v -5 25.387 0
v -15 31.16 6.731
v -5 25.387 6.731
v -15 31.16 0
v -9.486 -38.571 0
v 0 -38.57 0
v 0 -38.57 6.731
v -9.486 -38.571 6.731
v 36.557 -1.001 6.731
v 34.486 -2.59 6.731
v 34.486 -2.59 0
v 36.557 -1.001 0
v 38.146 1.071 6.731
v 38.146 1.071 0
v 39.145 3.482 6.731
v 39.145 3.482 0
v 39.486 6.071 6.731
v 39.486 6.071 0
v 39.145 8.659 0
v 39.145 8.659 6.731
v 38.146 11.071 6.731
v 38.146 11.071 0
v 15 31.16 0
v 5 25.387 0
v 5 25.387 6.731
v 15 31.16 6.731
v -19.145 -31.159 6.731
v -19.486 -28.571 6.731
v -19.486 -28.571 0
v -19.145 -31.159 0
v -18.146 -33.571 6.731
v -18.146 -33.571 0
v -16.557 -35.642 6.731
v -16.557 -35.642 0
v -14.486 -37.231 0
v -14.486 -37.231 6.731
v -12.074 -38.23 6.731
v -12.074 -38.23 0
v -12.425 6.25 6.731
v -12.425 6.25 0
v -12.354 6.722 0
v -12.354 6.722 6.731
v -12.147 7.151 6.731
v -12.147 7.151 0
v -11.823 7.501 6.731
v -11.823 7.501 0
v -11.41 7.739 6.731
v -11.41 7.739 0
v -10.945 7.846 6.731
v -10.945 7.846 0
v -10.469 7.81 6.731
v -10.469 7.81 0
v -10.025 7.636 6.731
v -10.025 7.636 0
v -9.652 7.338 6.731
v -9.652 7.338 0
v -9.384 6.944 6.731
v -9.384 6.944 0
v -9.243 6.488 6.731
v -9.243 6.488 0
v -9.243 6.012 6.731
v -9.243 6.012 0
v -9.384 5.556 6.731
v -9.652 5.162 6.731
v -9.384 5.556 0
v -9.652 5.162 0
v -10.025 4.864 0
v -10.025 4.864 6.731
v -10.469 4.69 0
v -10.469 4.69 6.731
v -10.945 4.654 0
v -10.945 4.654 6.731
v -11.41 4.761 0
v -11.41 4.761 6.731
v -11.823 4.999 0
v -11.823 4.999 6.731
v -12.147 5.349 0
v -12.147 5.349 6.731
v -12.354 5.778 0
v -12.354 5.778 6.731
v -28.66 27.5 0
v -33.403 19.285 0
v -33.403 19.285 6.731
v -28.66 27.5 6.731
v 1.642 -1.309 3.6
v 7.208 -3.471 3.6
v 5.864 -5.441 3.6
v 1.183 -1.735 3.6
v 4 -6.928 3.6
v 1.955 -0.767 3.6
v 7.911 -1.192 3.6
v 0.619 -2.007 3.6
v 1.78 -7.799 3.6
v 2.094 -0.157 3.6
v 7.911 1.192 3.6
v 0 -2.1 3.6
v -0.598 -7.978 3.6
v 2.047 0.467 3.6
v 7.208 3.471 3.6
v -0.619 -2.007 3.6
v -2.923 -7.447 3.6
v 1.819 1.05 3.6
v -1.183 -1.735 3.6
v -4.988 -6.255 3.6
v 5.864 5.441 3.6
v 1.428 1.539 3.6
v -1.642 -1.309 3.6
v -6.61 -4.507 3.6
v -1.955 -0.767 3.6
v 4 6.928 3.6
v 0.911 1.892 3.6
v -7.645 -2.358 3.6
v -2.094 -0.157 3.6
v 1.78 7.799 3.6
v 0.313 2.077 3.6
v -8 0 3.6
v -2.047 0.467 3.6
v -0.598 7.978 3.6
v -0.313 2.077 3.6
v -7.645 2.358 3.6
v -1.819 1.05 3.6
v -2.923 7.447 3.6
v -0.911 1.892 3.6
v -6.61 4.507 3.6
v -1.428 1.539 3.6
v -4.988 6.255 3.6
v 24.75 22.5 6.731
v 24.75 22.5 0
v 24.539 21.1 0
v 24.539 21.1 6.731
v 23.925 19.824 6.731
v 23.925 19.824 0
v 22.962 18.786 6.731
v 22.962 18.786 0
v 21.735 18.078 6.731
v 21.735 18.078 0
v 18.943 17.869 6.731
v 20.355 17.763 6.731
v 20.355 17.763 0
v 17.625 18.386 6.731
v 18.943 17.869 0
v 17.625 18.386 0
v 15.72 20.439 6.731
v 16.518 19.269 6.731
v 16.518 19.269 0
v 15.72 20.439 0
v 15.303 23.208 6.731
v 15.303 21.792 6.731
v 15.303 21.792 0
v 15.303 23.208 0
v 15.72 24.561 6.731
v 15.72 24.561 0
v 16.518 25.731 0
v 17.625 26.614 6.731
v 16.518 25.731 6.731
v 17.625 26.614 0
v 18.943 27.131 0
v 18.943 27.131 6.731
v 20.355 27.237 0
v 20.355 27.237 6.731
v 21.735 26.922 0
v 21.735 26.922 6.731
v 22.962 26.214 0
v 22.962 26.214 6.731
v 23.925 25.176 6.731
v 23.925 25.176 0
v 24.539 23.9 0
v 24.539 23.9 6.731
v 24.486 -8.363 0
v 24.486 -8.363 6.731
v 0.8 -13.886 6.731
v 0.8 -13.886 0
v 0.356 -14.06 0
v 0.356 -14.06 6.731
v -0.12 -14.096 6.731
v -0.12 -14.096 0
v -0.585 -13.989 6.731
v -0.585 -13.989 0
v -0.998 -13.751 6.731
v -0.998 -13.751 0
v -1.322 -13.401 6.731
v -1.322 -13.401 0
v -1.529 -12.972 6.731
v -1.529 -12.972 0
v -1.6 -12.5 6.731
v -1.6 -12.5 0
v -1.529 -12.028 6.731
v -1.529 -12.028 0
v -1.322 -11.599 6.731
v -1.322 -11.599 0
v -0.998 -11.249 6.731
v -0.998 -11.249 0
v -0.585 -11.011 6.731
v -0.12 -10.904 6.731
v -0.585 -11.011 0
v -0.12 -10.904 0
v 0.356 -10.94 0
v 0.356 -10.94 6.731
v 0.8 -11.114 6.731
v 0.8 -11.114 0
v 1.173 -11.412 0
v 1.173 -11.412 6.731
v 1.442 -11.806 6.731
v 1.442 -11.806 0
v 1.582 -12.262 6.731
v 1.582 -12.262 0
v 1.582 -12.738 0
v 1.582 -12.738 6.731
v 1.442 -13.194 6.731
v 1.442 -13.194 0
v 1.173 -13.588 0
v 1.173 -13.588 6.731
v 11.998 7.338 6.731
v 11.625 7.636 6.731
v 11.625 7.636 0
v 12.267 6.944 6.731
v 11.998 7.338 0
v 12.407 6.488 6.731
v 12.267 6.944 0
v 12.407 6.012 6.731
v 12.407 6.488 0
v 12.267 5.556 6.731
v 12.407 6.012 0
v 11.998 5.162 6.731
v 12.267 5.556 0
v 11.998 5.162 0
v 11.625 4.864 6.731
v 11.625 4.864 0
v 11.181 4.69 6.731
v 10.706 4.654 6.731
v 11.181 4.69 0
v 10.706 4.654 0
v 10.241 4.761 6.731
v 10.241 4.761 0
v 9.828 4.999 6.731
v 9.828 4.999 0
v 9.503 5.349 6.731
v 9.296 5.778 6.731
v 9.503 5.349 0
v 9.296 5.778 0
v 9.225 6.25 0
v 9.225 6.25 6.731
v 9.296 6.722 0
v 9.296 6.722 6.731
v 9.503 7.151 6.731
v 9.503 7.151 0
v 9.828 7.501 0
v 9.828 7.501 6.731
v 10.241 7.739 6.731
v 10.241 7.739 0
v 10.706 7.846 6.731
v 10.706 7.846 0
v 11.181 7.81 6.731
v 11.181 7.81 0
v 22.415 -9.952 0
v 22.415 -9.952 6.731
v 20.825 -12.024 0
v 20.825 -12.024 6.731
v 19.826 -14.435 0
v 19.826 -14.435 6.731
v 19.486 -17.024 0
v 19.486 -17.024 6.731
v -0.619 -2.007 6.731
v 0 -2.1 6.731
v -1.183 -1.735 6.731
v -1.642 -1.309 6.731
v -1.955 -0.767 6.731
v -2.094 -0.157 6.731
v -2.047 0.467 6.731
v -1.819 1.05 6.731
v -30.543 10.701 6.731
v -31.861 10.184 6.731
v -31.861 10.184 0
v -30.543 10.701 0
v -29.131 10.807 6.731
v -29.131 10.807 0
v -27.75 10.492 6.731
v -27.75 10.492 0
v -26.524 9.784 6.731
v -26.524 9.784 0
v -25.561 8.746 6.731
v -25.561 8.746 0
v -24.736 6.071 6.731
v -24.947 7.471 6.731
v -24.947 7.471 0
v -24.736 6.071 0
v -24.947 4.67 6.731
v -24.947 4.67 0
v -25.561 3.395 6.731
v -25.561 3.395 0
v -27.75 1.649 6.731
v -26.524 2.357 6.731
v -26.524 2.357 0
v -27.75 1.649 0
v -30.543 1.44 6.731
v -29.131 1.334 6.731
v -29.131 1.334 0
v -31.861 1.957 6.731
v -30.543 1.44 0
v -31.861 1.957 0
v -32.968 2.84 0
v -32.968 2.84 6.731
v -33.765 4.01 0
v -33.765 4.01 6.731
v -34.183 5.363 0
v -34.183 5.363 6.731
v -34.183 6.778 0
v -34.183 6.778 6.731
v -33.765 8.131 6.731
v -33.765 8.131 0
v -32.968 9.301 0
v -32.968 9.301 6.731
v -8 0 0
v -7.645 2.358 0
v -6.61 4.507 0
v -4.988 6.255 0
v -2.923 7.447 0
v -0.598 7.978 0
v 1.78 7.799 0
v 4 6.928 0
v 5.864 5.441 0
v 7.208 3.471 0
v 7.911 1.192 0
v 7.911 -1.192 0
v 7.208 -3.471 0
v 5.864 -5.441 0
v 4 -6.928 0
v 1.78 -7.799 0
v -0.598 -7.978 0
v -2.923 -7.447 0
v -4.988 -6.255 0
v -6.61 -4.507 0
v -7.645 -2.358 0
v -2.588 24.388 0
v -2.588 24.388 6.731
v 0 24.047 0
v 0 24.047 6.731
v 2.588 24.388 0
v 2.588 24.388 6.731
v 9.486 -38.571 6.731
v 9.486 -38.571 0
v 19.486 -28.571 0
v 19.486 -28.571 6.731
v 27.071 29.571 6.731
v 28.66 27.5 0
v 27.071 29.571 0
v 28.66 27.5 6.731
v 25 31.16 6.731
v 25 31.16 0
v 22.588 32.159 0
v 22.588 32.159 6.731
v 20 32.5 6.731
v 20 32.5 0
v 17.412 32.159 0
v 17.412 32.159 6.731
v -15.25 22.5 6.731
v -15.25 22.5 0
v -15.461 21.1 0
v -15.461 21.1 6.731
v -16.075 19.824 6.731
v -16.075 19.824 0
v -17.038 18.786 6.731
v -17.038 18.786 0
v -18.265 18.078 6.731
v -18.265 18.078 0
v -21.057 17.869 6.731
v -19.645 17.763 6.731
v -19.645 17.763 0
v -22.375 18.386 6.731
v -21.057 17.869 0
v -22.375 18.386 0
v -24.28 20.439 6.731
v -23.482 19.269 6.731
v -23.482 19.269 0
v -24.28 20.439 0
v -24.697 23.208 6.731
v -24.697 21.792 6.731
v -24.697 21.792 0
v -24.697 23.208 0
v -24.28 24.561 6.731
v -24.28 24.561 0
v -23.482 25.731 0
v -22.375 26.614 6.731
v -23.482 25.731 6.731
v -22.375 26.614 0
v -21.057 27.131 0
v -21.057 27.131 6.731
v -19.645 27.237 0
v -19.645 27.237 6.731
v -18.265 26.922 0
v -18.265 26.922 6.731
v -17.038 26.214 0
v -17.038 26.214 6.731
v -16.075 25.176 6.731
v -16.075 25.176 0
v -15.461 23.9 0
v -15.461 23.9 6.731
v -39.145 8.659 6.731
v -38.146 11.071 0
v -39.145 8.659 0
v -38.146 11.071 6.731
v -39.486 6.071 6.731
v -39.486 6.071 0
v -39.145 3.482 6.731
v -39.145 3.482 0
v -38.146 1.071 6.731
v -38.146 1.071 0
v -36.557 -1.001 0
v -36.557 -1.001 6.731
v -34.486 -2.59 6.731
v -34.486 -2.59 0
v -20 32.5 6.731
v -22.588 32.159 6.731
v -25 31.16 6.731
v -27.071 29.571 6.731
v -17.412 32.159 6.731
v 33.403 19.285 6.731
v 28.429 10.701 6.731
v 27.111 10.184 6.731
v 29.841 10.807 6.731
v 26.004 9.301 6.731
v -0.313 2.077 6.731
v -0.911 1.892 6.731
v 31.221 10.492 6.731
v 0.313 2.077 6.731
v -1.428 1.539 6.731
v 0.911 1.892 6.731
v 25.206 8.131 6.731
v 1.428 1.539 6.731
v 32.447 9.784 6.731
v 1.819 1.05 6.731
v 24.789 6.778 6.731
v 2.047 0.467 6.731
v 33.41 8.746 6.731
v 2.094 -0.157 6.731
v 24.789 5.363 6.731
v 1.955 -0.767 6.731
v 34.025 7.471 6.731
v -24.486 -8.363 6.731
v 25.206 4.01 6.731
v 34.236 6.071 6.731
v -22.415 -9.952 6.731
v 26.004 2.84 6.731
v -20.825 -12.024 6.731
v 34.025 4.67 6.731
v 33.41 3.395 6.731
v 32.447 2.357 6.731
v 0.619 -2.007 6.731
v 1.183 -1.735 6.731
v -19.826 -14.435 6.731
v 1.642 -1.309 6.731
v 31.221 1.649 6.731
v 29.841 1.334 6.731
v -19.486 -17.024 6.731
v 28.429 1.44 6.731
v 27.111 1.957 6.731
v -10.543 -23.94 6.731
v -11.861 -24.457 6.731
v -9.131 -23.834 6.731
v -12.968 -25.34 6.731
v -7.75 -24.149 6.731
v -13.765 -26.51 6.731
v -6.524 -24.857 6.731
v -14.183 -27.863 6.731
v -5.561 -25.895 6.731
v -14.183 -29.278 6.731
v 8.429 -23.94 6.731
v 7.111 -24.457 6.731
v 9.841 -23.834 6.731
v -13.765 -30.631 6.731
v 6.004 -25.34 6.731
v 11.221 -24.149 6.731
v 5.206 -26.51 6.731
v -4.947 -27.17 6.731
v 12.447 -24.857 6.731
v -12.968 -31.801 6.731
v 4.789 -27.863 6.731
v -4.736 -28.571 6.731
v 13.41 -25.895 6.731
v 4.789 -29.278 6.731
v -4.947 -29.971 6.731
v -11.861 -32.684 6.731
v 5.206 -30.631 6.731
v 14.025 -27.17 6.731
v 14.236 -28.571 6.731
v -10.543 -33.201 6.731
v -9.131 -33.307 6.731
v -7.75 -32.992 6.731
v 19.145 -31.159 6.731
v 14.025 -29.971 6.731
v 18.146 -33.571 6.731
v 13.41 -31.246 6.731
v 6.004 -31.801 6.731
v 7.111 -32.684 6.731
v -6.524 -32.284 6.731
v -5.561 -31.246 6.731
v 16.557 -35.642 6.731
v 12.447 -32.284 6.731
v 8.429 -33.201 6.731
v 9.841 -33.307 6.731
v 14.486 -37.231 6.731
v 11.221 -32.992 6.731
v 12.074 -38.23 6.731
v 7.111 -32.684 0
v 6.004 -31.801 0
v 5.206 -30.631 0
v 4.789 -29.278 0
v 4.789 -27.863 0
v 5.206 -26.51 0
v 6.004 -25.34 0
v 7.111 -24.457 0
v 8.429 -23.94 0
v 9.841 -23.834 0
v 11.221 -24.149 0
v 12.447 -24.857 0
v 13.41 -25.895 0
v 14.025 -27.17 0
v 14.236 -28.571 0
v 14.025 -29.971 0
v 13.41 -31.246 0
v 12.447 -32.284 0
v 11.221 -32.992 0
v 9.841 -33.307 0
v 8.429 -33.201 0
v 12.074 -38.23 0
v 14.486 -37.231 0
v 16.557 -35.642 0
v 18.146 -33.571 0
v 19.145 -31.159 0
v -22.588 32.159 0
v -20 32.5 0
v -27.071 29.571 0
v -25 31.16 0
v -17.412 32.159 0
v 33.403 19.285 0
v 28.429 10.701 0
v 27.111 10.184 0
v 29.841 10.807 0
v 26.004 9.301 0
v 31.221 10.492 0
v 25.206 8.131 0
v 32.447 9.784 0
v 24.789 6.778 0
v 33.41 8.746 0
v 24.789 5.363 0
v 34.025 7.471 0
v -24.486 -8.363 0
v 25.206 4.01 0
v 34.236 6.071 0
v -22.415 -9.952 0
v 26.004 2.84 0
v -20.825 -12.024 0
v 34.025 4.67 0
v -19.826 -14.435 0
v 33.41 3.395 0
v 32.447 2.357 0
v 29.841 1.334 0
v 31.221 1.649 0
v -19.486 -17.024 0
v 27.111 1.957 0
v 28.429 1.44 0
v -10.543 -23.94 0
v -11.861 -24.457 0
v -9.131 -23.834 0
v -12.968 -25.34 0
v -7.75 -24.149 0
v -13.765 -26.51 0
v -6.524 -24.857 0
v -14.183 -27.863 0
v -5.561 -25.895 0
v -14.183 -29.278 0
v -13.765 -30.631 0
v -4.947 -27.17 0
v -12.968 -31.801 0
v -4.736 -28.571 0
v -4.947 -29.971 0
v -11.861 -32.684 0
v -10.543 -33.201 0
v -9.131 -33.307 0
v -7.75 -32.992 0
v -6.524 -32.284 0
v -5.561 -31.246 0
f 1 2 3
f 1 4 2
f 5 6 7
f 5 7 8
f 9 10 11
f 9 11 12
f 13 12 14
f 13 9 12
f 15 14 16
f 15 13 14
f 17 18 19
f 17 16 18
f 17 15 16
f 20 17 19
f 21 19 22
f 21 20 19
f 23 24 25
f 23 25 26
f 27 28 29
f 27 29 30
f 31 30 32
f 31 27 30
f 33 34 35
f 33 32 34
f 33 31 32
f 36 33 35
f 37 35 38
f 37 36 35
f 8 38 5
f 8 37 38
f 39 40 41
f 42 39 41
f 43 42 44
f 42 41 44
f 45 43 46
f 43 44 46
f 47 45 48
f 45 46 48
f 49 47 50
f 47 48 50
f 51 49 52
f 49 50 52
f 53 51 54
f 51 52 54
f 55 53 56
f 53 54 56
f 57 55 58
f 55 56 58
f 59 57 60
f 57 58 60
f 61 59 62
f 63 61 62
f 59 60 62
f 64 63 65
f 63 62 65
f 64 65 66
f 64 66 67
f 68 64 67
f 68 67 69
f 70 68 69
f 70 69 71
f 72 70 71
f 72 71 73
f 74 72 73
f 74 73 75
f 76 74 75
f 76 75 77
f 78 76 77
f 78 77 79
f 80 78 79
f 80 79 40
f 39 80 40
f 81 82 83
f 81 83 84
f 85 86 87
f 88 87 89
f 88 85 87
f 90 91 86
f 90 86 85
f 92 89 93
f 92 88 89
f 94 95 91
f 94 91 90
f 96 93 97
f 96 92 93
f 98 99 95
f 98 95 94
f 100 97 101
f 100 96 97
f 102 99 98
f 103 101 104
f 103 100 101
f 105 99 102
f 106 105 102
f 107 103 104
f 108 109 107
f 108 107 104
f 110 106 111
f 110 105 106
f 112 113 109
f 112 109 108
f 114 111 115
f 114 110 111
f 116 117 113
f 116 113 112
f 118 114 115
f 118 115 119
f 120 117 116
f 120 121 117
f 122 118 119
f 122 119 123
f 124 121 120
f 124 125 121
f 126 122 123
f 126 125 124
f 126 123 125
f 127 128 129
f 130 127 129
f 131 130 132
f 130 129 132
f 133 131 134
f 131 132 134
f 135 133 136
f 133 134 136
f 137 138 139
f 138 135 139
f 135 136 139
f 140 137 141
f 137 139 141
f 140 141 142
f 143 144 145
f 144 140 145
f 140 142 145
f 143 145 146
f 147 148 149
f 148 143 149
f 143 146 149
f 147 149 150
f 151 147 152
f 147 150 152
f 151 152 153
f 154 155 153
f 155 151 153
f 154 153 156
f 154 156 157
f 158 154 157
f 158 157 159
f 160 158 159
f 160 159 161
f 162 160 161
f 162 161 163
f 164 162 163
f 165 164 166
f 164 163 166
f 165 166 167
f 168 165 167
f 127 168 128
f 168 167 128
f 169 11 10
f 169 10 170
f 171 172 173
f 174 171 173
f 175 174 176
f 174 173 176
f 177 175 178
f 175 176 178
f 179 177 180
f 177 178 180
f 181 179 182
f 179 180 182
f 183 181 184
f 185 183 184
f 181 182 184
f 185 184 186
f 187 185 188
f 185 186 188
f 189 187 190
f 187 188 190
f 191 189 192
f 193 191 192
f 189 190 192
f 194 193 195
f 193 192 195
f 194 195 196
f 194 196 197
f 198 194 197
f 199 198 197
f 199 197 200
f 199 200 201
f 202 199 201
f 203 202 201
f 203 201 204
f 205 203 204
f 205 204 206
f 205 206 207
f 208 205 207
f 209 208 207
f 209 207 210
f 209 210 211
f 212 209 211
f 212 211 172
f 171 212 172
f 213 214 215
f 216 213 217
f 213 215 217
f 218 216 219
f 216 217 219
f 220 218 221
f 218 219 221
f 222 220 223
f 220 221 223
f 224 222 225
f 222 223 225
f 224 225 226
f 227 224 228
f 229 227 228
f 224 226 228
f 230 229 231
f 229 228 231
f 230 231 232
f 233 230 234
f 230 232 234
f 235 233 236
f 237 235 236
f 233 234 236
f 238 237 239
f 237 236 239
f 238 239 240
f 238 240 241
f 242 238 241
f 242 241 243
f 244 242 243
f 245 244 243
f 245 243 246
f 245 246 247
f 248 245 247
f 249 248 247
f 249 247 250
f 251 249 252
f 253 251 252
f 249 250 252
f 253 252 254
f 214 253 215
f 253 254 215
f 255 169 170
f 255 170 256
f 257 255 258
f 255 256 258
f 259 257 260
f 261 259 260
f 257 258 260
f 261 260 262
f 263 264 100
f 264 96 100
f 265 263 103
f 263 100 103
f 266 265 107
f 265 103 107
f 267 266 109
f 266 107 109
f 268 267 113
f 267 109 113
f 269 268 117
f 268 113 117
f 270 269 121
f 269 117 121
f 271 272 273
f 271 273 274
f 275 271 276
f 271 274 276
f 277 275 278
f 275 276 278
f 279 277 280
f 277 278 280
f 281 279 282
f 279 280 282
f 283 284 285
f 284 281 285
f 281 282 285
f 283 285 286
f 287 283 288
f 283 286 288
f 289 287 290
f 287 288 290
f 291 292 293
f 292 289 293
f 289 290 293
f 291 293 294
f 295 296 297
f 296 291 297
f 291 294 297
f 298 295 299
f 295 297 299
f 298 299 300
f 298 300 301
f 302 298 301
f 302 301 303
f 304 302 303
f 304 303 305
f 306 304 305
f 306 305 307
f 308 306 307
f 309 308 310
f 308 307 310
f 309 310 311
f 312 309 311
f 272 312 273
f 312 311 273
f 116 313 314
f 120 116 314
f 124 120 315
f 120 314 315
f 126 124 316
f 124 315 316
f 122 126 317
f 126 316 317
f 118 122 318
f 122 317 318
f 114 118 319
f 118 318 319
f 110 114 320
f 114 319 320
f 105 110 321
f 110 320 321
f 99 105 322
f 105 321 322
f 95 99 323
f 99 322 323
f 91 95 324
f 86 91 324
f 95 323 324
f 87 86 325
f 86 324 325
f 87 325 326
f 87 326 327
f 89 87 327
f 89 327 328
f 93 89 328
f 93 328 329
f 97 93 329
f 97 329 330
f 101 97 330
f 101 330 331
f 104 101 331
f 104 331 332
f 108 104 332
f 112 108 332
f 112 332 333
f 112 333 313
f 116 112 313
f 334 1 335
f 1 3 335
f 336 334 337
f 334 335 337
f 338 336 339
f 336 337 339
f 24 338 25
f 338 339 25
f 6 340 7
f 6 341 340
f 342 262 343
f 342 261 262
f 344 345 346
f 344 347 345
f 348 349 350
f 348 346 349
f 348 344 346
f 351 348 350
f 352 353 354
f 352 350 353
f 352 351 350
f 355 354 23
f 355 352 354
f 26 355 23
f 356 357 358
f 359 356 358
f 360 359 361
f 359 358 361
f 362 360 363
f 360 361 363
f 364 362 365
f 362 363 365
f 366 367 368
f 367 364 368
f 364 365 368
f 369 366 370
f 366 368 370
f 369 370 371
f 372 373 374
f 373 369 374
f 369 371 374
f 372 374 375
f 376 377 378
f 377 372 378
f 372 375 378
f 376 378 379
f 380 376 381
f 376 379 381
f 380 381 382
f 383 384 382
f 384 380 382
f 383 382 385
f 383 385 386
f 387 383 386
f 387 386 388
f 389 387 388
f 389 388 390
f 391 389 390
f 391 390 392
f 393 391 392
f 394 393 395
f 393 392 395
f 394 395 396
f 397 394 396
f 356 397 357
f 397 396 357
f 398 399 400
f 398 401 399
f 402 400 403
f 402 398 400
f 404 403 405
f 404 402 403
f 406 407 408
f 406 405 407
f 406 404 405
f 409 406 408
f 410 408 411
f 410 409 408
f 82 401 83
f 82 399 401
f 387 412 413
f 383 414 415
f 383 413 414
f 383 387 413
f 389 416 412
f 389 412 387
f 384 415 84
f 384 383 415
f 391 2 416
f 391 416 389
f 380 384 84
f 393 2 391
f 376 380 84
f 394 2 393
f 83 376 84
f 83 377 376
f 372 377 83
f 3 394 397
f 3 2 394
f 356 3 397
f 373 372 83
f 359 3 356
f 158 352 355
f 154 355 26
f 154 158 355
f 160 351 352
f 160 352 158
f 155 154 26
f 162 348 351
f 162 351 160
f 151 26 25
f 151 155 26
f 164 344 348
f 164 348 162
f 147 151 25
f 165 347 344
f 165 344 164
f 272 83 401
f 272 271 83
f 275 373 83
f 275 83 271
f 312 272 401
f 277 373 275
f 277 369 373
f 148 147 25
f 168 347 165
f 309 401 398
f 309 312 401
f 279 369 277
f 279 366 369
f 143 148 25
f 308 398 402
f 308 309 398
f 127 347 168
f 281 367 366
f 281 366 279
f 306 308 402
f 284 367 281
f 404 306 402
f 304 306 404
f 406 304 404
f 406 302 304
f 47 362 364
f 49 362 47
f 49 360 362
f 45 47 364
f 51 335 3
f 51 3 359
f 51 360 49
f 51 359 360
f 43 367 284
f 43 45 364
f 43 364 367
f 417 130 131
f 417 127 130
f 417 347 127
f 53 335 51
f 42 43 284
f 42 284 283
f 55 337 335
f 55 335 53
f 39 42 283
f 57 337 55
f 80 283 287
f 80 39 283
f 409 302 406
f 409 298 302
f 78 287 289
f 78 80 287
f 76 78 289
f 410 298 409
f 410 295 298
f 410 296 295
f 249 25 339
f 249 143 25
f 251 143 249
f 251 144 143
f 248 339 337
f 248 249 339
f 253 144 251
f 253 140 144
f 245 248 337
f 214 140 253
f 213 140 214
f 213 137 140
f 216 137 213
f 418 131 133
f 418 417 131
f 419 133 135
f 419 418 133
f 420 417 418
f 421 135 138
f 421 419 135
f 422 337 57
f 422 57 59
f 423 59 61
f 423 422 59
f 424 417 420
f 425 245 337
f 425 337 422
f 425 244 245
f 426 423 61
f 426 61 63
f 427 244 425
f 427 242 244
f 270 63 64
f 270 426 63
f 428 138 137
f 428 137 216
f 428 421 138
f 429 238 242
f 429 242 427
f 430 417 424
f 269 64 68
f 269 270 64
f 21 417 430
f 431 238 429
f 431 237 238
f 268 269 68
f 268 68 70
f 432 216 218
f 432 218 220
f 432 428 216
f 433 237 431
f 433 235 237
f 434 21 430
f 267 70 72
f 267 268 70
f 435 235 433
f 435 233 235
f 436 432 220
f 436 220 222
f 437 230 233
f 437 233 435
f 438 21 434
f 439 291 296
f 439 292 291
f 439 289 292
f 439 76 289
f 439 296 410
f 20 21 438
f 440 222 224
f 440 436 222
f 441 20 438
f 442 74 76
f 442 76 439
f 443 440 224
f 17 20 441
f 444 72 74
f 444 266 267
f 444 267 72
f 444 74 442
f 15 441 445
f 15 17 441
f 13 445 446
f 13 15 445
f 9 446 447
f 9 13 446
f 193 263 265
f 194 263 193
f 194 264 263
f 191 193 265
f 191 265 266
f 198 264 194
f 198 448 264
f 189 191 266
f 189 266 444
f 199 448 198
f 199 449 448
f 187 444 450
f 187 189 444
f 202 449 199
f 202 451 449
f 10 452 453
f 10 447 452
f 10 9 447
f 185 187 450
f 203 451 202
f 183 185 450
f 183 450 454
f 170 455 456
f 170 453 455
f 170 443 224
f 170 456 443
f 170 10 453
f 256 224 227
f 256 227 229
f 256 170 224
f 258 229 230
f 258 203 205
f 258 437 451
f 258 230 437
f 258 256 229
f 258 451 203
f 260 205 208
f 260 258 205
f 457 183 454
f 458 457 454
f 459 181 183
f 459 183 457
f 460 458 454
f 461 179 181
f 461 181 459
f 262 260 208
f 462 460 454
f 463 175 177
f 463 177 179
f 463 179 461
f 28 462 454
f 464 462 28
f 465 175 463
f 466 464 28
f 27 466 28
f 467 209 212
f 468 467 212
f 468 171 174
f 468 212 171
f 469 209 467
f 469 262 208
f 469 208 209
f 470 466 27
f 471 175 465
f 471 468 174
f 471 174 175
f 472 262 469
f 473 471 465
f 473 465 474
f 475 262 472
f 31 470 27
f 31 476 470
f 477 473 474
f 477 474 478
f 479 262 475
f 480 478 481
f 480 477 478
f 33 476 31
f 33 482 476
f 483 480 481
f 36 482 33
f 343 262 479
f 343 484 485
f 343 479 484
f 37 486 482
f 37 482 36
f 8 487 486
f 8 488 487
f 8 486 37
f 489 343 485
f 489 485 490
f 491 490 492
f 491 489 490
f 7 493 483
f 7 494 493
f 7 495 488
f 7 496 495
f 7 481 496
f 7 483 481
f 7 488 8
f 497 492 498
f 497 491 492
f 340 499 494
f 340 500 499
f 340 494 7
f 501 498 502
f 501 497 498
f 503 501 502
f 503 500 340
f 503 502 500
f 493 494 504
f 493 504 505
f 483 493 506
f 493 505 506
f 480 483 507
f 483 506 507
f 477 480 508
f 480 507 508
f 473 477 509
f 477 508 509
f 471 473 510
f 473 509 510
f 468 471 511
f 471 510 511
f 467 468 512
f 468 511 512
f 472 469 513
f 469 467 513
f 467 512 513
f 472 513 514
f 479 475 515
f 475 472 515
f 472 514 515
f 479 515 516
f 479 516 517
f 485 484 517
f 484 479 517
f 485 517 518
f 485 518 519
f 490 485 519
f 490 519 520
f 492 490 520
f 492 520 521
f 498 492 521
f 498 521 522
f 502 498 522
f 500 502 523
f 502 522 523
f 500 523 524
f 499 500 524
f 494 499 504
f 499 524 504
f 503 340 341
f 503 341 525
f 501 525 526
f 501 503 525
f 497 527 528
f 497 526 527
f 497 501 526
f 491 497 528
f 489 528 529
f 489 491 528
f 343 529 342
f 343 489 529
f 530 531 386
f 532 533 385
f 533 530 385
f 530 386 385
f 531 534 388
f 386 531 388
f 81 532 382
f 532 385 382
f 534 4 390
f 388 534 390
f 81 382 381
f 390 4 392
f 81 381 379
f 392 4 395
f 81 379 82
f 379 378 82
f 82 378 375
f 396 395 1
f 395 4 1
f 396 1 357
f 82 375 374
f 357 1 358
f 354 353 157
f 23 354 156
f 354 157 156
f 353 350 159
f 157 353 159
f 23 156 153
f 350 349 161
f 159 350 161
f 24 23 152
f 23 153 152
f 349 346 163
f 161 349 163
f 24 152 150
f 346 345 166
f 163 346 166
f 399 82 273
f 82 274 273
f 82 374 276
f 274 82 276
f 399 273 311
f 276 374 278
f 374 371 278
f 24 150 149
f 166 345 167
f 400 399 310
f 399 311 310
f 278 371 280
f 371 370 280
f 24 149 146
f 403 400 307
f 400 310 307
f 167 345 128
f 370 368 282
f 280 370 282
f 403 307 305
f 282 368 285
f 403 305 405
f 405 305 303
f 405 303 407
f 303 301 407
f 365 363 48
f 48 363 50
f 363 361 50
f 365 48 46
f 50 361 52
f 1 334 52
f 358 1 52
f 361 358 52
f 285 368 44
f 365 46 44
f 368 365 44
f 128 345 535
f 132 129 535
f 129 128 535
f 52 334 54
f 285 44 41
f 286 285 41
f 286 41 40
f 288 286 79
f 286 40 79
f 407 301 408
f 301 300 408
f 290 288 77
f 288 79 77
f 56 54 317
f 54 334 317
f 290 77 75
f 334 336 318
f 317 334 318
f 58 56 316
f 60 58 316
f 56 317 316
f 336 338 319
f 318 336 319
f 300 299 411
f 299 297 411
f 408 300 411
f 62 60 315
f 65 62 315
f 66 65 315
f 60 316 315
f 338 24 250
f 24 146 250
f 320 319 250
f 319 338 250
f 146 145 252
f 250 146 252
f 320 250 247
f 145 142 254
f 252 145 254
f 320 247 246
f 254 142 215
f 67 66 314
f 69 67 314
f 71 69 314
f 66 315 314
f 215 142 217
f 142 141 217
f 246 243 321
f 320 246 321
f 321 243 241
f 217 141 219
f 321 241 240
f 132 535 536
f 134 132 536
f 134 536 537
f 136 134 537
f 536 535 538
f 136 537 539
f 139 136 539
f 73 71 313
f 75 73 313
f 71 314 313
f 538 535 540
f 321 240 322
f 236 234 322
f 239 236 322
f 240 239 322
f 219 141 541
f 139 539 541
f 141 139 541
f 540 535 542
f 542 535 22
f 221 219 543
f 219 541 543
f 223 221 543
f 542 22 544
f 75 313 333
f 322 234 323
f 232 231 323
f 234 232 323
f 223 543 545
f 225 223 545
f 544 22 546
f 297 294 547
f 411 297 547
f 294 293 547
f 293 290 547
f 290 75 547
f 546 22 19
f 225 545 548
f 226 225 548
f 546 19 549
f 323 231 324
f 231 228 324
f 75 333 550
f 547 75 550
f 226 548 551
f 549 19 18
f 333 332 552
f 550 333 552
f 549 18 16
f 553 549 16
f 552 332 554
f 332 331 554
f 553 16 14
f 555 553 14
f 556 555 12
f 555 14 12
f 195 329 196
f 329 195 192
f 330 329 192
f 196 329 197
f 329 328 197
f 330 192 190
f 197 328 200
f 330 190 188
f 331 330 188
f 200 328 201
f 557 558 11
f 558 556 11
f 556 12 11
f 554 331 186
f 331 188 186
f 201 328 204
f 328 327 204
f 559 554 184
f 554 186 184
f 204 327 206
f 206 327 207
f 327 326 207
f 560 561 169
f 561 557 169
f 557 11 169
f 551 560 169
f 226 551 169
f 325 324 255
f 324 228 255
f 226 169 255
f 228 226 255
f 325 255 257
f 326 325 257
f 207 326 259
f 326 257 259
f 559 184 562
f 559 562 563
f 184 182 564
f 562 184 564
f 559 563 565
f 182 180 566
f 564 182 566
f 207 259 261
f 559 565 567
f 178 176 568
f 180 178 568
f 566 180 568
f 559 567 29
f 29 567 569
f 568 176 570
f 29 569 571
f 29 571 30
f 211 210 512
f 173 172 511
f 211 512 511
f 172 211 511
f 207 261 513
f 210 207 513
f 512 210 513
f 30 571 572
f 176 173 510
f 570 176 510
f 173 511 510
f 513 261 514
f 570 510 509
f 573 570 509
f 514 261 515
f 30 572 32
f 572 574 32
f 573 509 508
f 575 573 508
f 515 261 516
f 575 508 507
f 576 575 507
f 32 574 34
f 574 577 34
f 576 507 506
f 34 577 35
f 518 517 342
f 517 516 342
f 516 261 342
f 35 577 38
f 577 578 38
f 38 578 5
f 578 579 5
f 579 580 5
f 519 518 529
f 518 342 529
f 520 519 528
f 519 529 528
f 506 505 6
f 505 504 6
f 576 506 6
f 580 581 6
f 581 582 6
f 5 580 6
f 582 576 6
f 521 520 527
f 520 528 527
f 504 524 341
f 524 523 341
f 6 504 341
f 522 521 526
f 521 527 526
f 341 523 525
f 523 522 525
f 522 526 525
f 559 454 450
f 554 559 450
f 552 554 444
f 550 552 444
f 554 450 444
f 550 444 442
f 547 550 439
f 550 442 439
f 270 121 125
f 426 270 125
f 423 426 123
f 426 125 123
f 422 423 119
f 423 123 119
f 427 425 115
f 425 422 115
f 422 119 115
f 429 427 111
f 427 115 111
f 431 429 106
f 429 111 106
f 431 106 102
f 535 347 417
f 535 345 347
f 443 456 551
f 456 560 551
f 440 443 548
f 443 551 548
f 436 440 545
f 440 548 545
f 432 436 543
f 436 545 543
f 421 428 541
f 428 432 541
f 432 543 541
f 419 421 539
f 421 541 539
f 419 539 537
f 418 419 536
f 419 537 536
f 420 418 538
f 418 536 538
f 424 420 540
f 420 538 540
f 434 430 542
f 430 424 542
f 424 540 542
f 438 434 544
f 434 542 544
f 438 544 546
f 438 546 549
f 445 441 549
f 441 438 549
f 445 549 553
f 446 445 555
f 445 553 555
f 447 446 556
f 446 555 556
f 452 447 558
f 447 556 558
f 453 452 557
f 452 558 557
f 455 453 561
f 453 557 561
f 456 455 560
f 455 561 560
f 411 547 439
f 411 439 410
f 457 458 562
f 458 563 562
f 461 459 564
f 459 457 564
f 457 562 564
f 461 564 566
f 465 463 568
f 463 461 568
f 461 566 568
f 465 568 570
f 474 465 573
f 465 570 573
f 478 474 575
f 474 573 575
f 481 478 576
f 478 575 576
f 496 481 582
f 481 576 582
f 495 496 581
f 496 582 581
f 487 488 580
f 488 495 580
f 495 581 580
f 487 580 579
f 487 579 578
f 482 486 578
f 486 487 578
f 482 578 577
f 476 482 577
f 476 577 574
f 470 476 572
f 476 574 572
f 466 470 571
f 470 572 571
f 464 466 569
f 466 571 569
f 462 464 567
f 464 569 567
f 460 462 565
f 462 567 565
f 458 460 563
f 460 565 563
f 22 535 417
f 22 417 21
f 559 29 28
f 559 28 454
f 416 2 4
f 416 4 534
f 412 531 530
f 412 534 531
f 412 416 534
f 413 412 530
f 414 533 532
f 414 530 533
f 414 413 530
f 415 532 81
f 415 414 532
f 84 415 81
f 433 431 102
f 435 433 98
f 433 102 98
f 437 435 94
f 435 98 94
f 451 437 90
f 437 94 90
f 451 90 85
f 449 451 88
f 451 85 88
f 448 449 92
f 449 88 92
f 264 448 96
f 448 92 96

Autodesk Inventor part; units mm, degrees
ref_plane "YZ Plane" through (0, 0, 0) normal (1, 0, 0) x (0, 1, 0)
ref_plane "XZ Plane" through (0, 0, 0) normal (0, 1, 0) x (-1, 0, 0)
ref_plane "XY Plane" through (0, 0, 0) normal (0, 0, 1) x (1, 0, 0)
sketch "Sketch1" plane through (0, 0, 0) normal (0, 0, 1) x (1, 0, 0)
  line L0 (0, 0) -> (-33.403, 19.2853)
  line L1 (0, 0) -> (33.403, 19.2853)
  arc A0 (1.8187, 1.05) -> (-1.8187, 1.05) centre (0, 0) ccw
  circle A1 centre (-20, 22.5) radius 4.75
  circle A2 centre (20, 22.5) radius 4.75
  line L2 (0, 0) -> (-27.7881, 0)
  line L3 (-33.403, 19.2853) -> (-23.6603, 36.1603)
  line L4 (23.6603, 36.1603) -> (33.403, 19.2853)
  line L5 (-23.6603, 36.1603) -> (0, 22.5)
  line L6 (0, 22.5) -> (23.6603, 36.1603)
  dimension "d0" = 120
  dimension "d1" = 2.1
  dimension "d2" = 9.5
  dimension "d3" = 40
  dimension "d4" = 20
  dimension "d5" = 22.5
  dimension "d6" = 30
  dimension "d10" = 10
  dimension "d30" = 10
extrude "Extrusion1" add sketch "Sketch1" along normal blind 6.731 contours L0 L3 L5 L6 L4 L1 A0
fillet "Fillet1" radius 10 3 edges at (-23.6603, 36.1603, 3.3655) (23.6603, 36.1603, 3.3655) (0, 22.5, 3.3655)
pattern_circular "Circular Pattern1" count 3 over 360 about axis through (0, 0, 0) along (0, 0, 1) of "Extrusion1", "Fillet1"
sketch "Sketch2" plane through (0, 0, 0) normal (0, 0, -1) x (-1, 0, 0)
  circle A0 centre (0, 0) radius 2.1 projected
  circle A1 centre (10.8253, 6.25) radius 1.6
  line L0 (19.4856, -17.0235) -> (19.4856, -28.5705) projected
  line L1 (10.8253, 6.25) -> (0, 0) construction
  line L2 (0, 0) -> (15.25, 0) construction
  point P0 (19.4856, -18.9295)
  dimension "d18" = 3.2
  dimension "d20" = 12.5
  dimension "d33" = 30
extrude "Extrusion2" cut sketch "Sketch2" against normal up to next contours A1
pattern_circular "Circular Pattern2" count 3 over 360 about axis through (0, 0, 0) along (0, 0, 1) of "Extrusion2"
sketch "Sketch3" plane through (0, 0, 0) normal (0, 0, -1) x (-1, 0, 0)
  circle A0 centre (0, 0) radius 2.1 projected
  circle A1 centre (0, 0) radius 8
  dimension "d26" = 16
extrude "Extrusion3" cut sketch "Sketch3" against normal blind 3.6
equation "\"d2\" = MAGDIA"
equation "\"d4\" = 0.5 * d3"
equation "\"d30\" = d10"
equation "\"d12\" = THICKB"
equation "\"d21\" = THICKB"
equation "\"THICKA\" = 3.175"
equation "\"THICKB\" = 6.731"
equation "\"THICKC\" = 12.7"
equation "\"MAGDIA\" = 9.5"
equation "\"BALLDIA\" = 12"
equation "\"THICKPLY\" = 5"
properties part number "Effector_Platform_V2"
